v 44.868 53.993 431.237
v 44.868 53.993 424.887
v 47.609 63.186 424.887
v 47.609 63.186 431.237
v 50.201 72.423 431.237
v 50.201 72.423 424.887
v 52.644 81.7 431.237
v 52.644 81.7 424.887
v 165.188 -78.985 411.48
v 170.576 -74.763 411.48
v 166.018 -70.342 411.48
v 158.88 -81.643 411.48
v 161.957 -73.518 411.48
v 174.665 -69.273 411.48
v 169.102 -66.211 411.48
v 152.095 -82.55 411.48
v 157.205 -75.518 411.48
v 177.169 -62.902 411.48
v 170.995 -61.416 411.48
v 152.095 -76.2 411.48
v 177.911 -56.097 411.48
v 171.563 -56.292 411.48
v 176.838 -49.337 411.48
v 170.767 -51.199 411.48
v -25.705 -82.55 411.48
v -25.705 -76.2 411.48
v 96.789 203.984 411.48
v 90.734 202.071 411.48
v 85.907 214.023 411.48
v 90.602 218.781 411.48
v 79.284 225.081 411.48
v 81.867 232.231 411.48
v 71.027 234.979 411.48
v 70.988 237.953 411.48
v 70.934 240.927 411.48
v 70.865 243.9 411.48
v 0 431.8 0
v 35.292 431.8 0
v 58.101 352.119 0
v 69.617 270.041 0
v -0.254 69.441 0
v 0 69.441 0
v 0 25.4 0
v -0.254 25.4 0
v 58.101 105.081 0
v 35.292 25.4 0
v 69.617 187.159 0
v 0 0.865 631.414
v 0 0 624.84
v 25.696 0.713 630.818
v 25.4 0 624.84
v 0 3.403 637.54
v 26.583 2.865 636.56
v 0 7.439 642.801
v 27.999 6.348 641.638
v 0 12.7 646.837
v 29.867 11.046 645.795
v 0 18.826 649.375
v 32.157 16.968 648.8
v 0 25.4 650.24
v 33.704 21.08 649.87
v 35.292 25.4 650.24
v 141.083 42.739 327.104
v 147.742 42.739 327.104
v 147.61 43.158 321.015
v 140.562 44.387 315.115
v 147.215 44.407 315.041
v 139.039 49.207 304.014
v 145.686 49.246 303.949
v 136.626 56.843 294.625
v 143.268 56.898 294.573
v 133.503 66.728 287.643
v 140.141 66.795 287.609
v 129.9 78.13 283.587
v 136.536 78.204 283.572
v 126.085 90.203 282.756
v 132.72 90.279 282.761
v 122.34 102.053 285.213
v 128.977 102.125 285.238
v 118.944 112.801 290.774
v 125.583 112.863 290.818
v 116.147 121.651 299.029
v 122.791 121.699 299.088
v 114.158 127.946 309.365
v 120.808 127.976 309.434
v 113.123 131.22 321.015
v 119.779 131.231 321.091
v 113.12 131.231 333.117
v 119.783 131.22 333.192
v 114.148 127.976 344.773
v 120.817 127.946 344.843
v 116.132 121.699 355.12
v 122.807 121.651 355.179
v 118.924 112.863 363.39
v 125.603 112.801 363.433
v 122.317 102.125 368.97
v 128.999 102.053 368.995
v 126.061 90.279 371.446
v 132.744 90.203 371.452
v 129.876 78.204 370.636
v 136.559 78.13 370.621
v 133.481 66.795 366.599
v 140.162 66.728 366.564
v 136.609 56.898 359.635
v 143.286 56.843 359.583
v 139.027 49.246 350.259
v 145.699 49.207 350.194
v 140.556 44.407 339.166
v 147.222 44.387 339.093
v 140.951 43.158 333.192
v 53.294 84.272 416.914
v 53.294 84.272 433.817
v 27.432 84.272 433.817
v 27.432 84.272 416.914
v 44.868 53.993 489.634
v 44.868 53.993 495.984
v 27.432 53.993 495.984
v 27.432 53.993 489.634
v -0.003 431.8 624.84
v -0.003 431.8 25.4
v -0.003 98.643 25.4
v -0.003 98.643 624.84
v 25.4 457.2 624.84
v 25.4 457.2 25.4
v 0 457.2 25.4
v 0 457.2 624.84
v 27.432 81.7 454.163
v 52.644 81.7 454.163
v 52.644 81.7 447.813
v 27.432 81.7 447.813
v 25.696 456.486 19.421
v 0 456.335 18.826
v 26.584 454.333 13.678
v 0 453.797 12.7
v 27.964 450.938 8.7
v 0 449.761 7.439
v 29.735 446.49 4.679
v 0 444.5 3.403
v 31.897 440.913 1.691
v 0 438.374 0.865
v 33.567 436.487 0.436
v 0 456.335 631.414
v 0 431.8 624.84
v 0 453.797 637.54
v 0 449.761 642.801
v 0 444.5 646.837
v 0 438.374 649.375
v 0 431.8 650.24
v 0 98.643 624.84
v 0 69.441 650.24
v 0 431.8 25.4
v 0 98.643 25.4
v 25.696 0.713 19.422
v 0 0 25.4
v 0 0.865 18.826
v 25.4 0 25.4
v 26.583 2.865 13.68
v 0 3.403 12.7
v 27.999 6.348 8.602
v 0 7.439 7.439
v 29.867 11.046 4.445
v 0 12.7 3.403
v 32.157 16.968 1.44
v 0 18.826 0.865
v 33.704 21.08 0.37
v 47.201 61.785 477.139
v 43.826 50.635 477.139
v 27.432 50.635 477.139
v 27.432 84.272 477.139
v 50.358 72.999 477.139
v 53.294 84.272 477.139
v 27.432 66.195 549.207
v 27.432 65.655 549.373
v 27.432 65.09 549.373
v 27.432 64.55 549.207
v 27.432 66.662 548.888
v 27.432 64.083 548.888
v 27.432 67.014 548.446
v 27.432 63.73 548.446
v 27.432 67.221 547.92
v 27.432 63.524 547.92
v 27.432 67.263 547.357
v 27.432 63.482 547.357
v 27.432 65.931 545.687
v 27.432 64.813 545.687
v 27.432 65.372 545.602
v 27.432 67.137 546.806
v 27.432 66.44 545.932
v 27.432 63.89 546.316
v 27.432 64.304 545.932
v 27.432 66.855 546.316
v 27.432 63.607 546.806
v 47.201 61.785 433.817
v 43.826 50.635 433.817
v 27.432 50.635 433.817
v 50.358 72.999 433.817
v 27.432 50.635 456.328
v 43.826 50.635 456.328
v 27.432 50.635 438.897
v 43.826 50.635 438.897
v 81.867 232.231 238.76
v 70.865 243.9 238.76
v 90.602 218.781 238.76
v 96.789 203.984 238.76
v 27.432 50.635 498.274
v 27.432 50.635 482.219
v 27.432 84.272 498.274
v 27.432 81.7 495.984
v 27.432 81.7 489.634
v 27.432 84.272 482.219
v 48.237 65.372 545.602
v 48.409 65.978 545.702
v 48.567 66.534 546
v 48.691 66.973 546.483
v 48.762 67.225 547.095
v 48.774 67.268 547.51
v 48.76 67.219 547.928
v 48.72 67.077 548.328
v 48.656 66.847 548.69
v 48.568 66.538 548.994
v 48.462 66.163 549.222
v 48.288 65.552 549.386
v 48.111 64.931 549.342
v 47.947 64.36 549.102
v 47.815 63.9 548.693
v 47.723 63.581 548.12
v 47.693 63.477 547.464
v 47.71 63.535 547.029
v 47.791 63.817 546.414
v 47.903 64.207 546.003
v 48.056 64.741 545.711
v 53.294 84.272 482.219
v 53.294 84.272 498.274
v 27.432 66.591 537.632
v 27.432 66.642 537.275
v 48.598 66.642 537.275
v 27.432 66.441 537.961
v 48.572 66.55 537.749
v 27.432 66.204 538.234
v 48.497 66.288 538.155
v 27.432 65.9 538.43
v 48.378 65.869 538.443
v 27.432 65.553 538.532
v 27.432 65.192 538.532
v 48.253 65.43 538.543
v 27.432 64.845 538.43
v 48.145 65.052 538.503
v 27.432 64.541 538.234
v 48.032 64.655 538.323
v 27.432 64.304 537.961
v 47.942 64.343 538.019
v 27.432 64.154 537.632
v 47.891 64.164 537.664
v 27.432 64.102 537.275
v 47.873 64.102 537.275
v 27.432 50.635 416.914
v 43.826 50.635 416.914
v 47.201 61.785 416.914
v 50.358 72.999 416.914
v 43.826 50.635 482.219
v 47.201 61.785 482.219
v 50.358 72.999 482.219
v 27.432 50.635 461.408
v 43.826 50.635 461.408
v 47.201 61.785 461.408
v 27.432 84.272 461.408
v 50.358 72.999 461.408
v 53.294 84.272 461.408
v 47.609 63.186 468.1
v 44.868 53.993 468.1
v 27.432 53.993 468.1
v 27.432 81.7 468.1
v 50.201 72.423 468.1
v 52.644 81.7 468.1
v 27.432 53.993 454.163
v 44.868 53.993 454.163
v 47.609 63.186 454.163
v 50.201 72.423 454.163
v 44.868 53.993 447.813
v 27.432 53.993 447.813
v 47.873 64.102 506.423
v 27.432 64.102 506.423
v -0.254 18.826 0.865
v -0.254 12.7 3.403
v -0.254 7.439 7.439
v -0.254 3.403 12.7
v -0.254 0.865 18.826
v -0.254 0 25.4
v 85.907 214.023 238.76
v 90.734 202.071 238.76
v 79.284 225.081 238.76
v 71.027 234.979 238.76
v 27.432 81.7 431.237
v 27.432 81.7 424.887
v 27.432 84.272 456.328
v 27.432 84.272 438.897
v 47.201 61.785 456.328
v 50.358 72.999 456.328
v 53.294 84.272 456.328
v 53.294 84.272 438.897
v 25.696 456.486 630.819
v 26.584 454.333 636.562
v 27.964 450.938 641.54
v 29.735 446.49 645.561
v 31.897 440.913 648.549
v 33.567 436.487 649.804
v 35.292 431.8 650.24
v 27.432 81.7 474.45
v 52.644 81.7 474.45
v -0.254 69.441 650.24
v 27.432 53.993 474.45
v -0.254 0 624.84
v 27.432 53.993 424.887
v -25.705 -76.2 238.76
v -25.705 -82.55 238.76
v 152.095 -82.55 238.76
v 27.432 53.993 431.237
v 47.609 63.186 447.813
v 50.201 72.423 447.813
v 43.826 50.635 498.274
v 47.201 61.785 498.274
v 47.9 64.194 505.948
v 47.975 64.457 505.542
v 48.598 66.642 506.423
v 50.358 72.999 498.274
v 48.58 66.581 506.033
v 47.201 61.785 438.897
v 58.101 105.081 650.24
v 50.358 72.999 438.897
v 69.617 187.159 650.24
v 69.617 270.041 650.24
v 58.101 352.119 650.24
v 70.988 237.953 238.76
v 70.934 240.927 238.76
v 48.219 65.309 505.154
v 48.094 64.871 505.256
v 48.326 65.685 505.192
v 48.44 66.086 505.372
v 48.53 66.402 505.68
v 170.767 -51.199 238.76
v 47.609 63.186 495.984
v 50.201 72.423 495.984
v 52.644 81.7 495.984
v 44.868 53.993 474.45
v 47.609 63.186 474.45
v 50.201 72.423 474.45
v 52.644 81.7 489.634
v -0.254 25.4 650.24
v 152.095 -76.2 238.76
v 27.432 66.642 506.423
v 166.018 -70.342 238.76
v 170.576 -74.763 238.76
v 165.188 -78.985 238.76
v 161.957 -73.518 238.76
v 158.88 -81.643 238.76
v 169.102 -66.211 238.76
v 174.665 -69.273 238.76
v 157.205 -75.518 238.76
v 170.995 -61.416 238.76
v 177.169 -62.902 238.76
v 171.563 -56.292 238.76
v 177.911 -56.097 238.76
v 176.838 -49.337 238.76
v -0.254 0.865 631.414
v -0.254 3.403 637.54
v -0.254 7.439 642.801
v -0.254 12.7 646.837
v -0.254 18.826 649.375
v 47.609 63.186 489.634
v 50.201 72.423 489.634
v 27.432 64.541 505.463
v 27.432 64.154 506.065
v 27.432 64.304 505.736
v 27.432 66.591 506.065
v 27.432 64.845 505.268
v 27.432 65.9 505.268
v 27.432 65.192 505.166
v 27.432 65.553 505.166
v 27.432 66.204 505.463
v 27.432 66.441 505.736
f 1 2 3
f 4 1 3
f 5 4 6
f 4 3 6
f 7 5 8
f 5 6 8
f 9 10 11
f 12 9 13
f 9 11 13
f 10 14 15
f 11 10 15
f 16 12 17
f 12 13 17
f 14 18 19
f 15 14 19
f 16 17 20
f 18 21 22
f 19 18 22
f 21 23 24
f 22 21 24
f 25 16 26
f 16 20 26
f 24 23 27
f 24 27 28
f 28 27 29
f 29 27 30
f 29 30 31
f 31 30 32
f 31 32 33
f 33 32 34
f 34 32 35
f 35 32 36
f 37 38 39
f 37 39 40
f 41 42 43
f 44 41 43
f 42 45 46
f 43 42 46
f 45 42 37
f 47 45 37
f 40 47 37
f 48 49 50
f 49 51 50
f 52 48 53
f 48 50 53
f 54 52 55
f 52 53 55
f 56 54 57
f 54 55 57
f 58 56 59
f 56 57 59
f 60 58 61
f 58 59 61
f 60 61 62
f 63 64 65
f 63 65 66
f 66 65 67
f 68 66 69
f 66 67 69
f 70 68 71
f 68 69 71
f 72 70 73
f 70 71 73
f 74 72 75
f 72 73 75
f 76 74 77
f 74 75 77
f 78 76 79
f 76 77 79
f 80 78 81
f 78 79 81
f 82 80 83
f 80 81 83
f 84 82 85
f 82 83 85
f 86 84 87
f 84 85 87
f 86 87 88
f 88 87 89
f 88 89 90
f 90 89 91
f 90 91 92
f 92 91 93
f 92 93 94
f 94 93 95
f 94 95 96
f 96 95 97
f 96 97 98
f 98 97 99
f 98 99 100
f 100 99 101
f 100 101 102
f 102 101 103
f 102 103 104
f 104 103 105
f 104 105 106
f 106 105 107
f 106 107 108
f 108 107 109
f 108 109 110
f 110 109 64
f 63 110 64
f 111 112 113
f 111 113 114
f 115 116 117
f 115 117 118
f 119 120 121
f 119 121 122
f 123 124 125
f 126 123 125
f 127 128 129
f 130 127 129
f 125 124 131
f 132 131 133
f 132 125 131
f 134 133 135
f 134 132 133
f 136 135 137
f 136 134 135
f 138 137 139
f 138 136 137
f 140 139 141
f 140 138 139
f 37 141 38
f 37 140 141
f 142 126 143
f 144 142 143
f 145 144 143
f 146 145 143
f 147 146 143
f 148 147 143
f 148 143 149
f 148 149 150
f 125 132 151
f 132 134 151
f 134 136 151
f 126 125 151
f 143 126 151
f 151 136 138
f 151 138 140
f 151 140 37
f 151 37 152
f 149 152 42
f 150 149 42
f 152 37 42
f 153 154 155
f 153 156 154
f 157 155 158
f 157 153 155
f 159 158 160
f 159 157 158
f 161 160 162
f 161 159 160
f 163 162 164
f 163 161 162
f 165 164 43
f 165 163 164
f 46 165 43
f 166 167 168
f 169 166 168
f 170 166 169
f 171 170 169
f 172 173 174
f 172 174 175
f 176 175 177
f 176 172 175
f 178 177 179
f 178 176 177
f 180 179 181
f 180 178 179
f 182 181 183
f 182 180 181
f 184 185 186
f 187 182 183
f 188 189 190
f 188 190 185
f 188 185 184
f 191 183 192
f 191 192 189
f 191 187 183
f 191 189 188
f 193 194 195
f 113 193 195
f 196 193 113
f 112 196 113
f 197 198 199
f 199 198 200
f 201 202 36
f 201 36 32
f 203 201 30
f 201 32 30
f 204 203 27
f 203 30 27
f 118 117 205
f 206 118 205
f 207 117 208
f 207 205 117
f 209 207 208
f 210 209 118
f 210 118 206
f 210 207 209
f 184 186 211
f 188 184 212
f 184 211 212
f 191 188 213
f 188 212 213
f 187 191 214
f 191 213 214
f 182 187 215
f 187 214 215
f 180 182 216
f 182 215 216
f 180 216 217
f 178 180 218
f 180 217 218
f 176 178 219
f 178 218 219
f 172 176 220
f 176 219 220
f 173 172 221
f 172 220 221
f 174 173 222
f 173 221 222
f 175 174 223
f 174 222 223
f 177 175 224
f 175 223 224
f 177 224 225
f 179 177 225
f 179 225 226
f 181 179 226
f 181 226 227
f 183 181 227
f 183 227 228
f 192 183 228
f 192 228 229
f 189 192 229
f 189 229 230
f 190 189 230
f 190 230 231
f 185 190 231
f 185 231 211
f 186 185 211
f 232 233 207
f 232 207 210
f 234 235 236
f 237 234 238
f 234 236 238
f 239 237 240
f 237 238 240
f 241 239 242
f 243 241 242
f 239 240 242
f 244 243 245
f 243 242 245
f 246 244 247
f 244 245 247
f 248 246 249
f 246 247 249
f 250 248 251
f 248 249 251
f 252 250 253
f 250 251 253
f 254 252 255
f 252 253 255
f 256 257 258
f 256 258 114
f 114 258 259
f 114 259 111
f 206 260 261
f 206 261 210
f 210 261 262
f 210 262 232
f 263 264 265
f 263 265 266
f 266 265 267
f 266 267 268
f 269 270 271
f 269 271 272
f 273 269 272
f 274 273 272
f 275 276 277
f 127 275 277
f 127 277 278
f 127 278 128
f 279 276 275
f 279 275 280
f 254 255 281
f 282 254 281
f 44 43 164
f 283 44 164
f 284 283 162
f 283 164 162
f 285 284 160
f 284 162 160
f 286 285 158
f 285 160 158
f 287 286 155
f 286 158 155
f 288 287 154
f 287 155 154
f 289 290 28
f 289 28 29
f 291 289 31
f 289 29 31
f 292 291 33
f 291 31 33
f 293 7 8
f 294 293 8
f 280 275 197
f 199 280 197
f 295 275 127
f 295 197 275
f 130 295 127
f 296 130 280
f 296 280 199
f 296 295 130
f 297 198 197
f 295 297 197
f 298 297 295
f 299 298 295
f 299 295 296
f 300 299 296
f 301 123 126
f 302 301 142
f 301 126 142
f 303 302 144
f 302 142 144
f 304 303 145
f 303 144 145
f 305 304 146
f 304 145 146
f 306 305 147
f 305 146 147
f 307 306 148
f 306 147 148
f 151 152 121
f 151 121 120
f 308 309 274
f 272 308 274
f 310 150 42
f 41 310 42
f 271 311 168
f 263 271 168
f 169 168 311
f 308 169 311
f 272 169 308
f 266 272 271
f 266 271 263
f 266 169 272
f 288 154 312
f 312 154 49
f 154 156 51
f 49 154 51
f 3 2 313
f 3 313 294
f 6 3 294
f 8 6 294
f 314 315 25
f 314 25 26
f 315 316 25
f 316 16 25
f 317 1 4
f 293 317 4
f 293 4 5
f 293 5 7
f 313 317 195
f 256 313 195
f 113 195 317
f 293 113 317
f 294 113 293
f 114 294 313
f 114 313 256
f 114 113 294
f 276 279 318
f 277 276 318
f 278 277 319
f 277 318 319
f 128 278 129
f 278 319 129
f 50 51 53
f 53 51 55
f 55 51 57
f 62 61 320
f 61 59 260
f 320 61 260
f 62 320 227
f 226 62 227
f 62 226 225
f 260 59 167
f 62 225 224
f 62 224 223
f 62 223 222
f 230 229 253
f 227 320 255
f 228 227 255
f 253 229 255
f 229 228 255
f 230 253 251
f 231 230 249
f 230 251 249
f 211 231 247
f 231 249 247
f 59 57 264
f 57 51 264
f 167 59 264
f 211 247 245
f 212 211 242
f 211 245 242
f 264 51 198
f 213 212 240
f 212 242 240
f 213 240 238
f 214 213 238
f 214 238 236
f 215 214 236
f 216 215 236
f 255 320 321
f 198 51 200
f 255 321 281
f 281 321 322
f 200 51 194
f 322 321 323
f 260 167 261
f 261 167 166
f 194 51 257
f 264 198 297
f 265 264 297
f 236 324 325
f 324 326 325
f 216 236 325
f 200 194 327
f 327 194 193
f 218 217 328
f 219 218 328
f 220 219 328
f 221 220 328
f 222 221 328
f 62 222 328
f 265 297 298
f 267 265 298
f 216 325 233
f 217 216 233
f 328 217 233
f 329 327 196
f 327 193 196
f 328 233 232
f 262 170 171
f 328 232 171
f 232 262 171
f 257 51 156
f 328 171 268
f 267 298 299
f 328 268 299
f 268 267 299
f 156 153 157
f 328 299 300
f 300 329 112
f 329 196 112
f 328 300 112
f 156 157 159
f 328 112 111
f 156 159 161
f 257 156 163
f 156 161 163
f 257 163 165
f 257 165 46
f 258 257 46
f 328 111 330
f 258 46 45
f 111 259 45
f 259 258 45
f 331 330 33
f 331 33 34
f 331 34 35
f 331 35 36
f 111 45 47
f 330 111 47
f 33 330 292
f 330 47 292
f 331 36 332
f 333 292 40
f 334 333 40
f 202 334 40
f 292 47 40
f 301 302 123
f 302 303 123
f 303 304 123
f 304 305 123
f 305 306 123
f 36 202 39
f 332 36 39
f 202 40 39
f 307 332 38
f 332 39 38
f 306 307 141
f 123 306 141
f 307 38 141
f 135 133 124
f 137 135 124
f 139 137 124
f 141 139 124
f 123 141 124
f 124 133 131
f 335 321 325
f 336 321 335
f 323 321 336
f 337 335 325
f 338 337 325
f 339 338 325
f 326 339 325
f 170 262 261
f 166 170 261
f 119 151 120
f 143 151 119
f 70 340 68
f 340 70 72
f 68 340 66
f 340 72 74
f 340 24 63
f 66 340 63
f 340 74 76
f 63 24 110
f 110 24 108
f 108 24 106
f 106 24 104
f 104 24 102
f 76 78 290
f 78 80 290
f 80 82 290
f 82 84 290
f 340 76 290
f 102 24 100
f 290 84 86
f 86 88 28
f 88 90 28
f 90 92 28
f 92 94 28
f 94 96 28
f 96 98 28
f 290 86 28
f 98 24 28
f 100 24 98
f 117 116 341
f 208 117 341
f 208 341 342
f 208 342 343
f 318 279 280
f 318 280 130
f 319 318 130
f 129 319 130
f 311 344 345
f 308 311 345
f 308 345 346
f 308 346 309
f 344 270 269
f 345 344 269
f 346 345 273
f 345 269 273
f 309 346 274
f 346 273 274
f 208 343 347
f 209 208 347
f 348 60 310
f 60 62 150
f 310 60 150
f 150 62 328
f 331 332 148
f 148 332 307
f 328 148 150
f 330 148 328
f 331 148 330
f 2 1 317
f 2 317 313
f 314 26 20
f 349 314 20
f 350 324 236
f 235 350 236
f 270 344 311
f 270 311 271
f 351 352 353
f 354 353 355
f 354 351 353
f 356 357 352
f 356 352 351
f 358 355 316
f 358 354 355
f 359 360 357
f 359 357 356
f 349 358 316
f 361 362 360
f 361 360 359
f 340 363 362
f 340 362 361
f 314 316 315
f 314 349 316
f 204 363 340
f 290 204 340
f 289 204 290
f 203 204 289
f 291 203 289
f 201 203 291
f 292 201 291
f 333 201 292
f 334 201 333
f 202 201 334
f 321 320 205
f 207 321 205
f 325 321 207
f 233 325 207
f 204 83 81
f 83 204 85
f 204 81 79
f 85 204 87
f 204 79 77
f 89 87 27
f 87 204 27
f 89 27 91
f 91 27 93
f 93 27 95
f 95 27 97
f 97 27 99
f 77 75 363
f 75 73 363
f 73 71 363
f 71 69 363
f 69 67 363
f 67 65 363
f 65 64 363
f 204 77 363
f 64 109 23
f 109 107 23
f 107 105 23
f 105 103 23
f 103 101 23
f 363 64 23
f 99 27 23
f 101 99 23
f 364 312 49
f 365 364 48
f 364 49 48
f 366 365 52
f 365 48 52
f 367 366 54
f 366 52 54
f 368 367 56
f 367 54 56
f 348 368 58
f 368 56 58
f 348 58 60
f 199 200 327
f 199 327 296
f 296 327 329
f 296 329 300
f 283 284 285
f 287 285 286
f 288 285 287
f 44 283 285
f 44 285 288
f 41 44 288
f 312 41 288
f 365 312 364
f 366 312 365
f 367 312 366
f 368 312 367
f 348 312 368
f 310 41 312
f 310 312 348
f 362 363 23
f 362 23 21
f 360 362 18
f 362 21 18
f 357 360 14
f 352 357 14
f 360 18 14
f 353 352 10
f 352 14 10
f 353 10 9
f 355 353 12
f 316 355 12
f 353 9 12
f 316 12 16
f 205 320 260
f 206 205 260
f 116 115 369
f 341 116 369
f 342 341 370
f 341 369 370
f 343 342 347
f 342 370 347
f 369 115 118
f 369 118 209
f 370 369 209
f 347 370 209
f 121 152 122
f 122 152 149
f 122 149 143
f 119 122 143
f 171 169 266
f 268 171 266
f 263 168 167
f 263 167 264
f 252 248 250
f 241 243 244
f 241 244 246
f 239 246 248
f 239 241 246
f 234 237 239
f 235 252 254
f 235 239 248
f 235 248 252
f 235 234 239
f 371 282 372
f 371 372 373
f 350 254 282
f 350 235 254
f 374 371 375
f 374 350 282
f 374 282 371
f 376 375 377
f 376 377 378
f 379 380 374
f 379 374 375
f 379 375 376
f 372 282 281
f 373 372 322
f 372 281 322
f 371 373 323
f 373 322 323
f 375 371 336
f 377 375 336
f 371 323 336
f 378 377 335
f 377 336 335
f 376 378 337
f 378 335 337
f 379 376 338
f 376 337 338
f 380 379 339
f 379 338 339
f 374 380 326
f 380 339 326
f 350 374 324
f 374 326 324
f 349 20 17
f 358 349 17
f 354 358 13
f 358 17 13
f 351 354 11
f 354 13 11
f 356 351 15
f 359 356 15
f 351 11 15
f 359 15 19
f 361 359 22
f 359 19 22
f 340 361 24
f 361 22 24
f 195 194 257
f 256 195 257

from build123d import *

# Parameters (mm, degrees)
BOSS_EXTRUDE1_DEPTH = 650.24
FILLET1_R           = 25.4
BOSS_EXTRUDE2_DEPTH = 0.254
SKETCH4_W           = 599.44
SKETCH4_H           = 333.15660942
BOSS_EXTRUDE3_DEPTH = 0.00254
BOSS_EXTRUDE4_DEPTH = 86.36
SKETCH6_R           = 44.45
CUT_EXTRUDE1_DEPTH  = 99.568
SKETCH7_W           = 17.431192508
SKETCH7_H           = 33.637597394
SKETCH7_W_2         = 6.35
SKETCH7_H_2         = 27.707593027
SKETCH7_W_3         = 16.902871881
SKETCH7_W_4         = 15.731237492
SKETCH7_W_5         = 16.054307847
SKETCH7_R           = 1.896030158
CUT_EXTRUDE2_DEPTH  = 173.228


with BuildPart() as part:
    # Sketch1 → Boss-Extrude1 (new body)
    with BuildSketch(Plane.XY):
        with BuildLine():
            Line((0, 0), (25.4, 0))
            ThreePointArc((25.4, 0), (71.061606083, 228.6), (25.4, 457.2))
            Line((25.4, 457.2), (0, 457.2))
            Line((0, 457.2), (0, 0))
        make_face()
    extrude(amount=BOSS_EXTRUDE1_DEPTH)

    # Fillet1
    fillet1_edges = [part.edges().sort_by_distance(p)[0] for p in [
        (12.7, 457.2, 650.24),
        (12.7, 457.2, 0),
        (12.7, 0, 0),
        (12.7, 0, 650.24),
    ]]
    fillet(fillet1_edges, radius=FILLET1_R)

    # Sketch2 → Boss-Extrude2 (add)
    with BuildSketch(Plane.ZY):
        with BuildLine():
            Line((0, 69.440928173), (0, 25.4))
            ThreePointArc((0, 25.4), (7.439487758, 7.439487758), (25.4, 0))
            Line((25.4, 0), (624.84, 0))
            ThreePointArc((624.84, 0), (642.800512242, 7.439487758), (650.24, 25.4))
            Line((650.24, 25.4), (650.24, 69.440928173))
            Line((650.24, 69.440928173), (0, 69.440928173))
        make_face()
    extrude(amount=BOSS_EXTRUDE2_DEPTH)

    # Sketch4 → Boss-Extrude3 (add)
    with BuildSketch(Plane.ZY):
        with Locations((325.12, 265.22169529)):
            Rectangle(SKETCH4_W, SKETCH4_H)
    extrude(amount=BOSS_EXTRUDE3_DEPTH)

    # Sketch5 → Boss-Extrude4 (add, symmetric)
    with BuildSketch(Plane.XY.offset(325.12)):
        with BuildLine():
            Line((170.767248261, -51.198725882), (90.734414709, 202.070998511))
            ThreePointArc((90.734414709, 202.070998511), (82.810722474, 219.680826846), (71.027410341, 234.979340102))
            ThreePointArc((71.027410341, 234.979340102), (70.962867279, 239.439815668), (70.86488784, 243.899682046))
            ThreePointArc((70.86488784, 243.899682046), (86.537300589, 225.702245278), (96.789301226, 203.984333103))
            Line((96.789301226, 203.984333103), (176.83835346, -49.336716487))
            ThreePointArc((176.83835346, -49.336716487), (172.803446222, -72.154097904), (152.095027867, -82.55))
            Line((152.095027867, -82.55), (-25.704972133, -82.55))
            Line((-25.704972133, -82.55), (-25.704972133, -76.2))
            Line((-25.704972133, -76.2), (152.095027867, -76.2))
            ThreePointArc((152.095027867, -76.2), (167.697235419, -68.379202467), (170.767248261, -51.198725882))
        make_face()
    extrude(amount=BOSS_EXTRUDE4_DEPTH, both=True)

    # Sketch6 → Cut-Extrude1 (cut)
    with BuildSketch(Plane(origin=(200.66, 0, 0), x_dir=(0, 0, -1), z_dir=(1, 0, 0))):
        with Locations(Location((-327.103881197, 87.189356475, 0), (0, 0, 270))):
            Circle(SKETCH6_R)
    extrude(amount=-CUT_EXTRUDE1_DEPTH, mode=Mode.SUBTRACT)

    # Sketch7 → Cut-Extrude2 (cut)
    # profile 1 of 6: a face of its own
    with BuildSketch(Plane(origin=(200.66, 0, 0), x_dir=(0, 0, -1), z_dir=(1, 0, 0))):
        with Locations((-447.612414344, 67.453463266)):
            Rectangle(SKETCH7_W, SKETCH7_H)
        with Locations((-450.987768144, 67.846432455)):
            Rectangle(SKETCH7_W_2, SKETCH7_H_2, mode=Mode.SUBTRACT)
    # profile 2 of 6: a face of its own
    with BuildSketch(Plane(origin=(200.66, 0, 0), x_dir=(0, 0, -1), z_dir=(1, 0, 0))):
        with Locations((-425.36538215, 67.453463266)):
            Rectangle(SKETCH7_W_3, SKETCH7_H)
        with Locations((-428.061900395, 67.846432455)):
            Rectangle(SKETCH7_W_2, SKETCH7_H_2, mode=Mode.SUBTRACT)
    # profile 3 of 6: a face of its own
    with BuildSketch(Plane(origin=(200.66, 0, 0), x_dir=(0, 0, -1), z_dir=(1, 0, 0))):
        with Locations((-469.273629344, 67.453463266)):
            Rectangle(SKETCH7_W_4, SKETCH7_H)
        with Locations((-471.274687087, 67.846432455)):
            Rectangle(SKETCH7_W_2, SKETCH7_H_2, mode=Mode.SUBTRACT)
    # profile 4 of 6: a face of its own
    with BuildSketch(Plane(origin=(200.66, 0, 0), x_dir=(0, 0, -1), z_dir=(1, 0, 0))):
        with Locations((-490.246402014, 67.453463266)):
            Rectangle(SKETCH7_W_5, SKETCH7_H)
        with Locations((-492.809474486, 67.846432455)):
            Rectangle(SKETCH7_W_2, SKETCH7_H_2, mode=Mode.SUBTRACT)
    # profile 5 of 6: a face of its own
    with BuildSketch(Plane(origin=(200.66, 0, 0), x_dir=(0, 0, -1), z_dir=(1, 0, 0))):
        with BuildLine():
            Line((-506.422738648, 66.642270475), (-537.274582932, 66.642270475))
            ThreePointArc((-537.274582932, 66.642270475), (-538.544582932, 65.372270475), (-537.274582932, 64.102270475))
            Line((-537.274582932, 64.102270475), (-506.422738648, 64.102270475))
            ThreePointArc((-506.422738648, 64.102270475), (-505.152738648, 65.372270475), (-506.422738648, 66.642270475))
        make_face()
    # profile 6 of 6: a face of its own
    with BuildSketch(Plane(origin=(200.66, 0, 0), x_dir=(0, 0, -1), z_dir=(1, 0, 0))):
        with Locations((-547.498439967, 65.372270475)):
            Circle(SKETCH7_R)
    extrude(amount=-CUT_EXTRUDE2_DEPTH, mode=Mode.SUBTRACT)


solid = part.part
